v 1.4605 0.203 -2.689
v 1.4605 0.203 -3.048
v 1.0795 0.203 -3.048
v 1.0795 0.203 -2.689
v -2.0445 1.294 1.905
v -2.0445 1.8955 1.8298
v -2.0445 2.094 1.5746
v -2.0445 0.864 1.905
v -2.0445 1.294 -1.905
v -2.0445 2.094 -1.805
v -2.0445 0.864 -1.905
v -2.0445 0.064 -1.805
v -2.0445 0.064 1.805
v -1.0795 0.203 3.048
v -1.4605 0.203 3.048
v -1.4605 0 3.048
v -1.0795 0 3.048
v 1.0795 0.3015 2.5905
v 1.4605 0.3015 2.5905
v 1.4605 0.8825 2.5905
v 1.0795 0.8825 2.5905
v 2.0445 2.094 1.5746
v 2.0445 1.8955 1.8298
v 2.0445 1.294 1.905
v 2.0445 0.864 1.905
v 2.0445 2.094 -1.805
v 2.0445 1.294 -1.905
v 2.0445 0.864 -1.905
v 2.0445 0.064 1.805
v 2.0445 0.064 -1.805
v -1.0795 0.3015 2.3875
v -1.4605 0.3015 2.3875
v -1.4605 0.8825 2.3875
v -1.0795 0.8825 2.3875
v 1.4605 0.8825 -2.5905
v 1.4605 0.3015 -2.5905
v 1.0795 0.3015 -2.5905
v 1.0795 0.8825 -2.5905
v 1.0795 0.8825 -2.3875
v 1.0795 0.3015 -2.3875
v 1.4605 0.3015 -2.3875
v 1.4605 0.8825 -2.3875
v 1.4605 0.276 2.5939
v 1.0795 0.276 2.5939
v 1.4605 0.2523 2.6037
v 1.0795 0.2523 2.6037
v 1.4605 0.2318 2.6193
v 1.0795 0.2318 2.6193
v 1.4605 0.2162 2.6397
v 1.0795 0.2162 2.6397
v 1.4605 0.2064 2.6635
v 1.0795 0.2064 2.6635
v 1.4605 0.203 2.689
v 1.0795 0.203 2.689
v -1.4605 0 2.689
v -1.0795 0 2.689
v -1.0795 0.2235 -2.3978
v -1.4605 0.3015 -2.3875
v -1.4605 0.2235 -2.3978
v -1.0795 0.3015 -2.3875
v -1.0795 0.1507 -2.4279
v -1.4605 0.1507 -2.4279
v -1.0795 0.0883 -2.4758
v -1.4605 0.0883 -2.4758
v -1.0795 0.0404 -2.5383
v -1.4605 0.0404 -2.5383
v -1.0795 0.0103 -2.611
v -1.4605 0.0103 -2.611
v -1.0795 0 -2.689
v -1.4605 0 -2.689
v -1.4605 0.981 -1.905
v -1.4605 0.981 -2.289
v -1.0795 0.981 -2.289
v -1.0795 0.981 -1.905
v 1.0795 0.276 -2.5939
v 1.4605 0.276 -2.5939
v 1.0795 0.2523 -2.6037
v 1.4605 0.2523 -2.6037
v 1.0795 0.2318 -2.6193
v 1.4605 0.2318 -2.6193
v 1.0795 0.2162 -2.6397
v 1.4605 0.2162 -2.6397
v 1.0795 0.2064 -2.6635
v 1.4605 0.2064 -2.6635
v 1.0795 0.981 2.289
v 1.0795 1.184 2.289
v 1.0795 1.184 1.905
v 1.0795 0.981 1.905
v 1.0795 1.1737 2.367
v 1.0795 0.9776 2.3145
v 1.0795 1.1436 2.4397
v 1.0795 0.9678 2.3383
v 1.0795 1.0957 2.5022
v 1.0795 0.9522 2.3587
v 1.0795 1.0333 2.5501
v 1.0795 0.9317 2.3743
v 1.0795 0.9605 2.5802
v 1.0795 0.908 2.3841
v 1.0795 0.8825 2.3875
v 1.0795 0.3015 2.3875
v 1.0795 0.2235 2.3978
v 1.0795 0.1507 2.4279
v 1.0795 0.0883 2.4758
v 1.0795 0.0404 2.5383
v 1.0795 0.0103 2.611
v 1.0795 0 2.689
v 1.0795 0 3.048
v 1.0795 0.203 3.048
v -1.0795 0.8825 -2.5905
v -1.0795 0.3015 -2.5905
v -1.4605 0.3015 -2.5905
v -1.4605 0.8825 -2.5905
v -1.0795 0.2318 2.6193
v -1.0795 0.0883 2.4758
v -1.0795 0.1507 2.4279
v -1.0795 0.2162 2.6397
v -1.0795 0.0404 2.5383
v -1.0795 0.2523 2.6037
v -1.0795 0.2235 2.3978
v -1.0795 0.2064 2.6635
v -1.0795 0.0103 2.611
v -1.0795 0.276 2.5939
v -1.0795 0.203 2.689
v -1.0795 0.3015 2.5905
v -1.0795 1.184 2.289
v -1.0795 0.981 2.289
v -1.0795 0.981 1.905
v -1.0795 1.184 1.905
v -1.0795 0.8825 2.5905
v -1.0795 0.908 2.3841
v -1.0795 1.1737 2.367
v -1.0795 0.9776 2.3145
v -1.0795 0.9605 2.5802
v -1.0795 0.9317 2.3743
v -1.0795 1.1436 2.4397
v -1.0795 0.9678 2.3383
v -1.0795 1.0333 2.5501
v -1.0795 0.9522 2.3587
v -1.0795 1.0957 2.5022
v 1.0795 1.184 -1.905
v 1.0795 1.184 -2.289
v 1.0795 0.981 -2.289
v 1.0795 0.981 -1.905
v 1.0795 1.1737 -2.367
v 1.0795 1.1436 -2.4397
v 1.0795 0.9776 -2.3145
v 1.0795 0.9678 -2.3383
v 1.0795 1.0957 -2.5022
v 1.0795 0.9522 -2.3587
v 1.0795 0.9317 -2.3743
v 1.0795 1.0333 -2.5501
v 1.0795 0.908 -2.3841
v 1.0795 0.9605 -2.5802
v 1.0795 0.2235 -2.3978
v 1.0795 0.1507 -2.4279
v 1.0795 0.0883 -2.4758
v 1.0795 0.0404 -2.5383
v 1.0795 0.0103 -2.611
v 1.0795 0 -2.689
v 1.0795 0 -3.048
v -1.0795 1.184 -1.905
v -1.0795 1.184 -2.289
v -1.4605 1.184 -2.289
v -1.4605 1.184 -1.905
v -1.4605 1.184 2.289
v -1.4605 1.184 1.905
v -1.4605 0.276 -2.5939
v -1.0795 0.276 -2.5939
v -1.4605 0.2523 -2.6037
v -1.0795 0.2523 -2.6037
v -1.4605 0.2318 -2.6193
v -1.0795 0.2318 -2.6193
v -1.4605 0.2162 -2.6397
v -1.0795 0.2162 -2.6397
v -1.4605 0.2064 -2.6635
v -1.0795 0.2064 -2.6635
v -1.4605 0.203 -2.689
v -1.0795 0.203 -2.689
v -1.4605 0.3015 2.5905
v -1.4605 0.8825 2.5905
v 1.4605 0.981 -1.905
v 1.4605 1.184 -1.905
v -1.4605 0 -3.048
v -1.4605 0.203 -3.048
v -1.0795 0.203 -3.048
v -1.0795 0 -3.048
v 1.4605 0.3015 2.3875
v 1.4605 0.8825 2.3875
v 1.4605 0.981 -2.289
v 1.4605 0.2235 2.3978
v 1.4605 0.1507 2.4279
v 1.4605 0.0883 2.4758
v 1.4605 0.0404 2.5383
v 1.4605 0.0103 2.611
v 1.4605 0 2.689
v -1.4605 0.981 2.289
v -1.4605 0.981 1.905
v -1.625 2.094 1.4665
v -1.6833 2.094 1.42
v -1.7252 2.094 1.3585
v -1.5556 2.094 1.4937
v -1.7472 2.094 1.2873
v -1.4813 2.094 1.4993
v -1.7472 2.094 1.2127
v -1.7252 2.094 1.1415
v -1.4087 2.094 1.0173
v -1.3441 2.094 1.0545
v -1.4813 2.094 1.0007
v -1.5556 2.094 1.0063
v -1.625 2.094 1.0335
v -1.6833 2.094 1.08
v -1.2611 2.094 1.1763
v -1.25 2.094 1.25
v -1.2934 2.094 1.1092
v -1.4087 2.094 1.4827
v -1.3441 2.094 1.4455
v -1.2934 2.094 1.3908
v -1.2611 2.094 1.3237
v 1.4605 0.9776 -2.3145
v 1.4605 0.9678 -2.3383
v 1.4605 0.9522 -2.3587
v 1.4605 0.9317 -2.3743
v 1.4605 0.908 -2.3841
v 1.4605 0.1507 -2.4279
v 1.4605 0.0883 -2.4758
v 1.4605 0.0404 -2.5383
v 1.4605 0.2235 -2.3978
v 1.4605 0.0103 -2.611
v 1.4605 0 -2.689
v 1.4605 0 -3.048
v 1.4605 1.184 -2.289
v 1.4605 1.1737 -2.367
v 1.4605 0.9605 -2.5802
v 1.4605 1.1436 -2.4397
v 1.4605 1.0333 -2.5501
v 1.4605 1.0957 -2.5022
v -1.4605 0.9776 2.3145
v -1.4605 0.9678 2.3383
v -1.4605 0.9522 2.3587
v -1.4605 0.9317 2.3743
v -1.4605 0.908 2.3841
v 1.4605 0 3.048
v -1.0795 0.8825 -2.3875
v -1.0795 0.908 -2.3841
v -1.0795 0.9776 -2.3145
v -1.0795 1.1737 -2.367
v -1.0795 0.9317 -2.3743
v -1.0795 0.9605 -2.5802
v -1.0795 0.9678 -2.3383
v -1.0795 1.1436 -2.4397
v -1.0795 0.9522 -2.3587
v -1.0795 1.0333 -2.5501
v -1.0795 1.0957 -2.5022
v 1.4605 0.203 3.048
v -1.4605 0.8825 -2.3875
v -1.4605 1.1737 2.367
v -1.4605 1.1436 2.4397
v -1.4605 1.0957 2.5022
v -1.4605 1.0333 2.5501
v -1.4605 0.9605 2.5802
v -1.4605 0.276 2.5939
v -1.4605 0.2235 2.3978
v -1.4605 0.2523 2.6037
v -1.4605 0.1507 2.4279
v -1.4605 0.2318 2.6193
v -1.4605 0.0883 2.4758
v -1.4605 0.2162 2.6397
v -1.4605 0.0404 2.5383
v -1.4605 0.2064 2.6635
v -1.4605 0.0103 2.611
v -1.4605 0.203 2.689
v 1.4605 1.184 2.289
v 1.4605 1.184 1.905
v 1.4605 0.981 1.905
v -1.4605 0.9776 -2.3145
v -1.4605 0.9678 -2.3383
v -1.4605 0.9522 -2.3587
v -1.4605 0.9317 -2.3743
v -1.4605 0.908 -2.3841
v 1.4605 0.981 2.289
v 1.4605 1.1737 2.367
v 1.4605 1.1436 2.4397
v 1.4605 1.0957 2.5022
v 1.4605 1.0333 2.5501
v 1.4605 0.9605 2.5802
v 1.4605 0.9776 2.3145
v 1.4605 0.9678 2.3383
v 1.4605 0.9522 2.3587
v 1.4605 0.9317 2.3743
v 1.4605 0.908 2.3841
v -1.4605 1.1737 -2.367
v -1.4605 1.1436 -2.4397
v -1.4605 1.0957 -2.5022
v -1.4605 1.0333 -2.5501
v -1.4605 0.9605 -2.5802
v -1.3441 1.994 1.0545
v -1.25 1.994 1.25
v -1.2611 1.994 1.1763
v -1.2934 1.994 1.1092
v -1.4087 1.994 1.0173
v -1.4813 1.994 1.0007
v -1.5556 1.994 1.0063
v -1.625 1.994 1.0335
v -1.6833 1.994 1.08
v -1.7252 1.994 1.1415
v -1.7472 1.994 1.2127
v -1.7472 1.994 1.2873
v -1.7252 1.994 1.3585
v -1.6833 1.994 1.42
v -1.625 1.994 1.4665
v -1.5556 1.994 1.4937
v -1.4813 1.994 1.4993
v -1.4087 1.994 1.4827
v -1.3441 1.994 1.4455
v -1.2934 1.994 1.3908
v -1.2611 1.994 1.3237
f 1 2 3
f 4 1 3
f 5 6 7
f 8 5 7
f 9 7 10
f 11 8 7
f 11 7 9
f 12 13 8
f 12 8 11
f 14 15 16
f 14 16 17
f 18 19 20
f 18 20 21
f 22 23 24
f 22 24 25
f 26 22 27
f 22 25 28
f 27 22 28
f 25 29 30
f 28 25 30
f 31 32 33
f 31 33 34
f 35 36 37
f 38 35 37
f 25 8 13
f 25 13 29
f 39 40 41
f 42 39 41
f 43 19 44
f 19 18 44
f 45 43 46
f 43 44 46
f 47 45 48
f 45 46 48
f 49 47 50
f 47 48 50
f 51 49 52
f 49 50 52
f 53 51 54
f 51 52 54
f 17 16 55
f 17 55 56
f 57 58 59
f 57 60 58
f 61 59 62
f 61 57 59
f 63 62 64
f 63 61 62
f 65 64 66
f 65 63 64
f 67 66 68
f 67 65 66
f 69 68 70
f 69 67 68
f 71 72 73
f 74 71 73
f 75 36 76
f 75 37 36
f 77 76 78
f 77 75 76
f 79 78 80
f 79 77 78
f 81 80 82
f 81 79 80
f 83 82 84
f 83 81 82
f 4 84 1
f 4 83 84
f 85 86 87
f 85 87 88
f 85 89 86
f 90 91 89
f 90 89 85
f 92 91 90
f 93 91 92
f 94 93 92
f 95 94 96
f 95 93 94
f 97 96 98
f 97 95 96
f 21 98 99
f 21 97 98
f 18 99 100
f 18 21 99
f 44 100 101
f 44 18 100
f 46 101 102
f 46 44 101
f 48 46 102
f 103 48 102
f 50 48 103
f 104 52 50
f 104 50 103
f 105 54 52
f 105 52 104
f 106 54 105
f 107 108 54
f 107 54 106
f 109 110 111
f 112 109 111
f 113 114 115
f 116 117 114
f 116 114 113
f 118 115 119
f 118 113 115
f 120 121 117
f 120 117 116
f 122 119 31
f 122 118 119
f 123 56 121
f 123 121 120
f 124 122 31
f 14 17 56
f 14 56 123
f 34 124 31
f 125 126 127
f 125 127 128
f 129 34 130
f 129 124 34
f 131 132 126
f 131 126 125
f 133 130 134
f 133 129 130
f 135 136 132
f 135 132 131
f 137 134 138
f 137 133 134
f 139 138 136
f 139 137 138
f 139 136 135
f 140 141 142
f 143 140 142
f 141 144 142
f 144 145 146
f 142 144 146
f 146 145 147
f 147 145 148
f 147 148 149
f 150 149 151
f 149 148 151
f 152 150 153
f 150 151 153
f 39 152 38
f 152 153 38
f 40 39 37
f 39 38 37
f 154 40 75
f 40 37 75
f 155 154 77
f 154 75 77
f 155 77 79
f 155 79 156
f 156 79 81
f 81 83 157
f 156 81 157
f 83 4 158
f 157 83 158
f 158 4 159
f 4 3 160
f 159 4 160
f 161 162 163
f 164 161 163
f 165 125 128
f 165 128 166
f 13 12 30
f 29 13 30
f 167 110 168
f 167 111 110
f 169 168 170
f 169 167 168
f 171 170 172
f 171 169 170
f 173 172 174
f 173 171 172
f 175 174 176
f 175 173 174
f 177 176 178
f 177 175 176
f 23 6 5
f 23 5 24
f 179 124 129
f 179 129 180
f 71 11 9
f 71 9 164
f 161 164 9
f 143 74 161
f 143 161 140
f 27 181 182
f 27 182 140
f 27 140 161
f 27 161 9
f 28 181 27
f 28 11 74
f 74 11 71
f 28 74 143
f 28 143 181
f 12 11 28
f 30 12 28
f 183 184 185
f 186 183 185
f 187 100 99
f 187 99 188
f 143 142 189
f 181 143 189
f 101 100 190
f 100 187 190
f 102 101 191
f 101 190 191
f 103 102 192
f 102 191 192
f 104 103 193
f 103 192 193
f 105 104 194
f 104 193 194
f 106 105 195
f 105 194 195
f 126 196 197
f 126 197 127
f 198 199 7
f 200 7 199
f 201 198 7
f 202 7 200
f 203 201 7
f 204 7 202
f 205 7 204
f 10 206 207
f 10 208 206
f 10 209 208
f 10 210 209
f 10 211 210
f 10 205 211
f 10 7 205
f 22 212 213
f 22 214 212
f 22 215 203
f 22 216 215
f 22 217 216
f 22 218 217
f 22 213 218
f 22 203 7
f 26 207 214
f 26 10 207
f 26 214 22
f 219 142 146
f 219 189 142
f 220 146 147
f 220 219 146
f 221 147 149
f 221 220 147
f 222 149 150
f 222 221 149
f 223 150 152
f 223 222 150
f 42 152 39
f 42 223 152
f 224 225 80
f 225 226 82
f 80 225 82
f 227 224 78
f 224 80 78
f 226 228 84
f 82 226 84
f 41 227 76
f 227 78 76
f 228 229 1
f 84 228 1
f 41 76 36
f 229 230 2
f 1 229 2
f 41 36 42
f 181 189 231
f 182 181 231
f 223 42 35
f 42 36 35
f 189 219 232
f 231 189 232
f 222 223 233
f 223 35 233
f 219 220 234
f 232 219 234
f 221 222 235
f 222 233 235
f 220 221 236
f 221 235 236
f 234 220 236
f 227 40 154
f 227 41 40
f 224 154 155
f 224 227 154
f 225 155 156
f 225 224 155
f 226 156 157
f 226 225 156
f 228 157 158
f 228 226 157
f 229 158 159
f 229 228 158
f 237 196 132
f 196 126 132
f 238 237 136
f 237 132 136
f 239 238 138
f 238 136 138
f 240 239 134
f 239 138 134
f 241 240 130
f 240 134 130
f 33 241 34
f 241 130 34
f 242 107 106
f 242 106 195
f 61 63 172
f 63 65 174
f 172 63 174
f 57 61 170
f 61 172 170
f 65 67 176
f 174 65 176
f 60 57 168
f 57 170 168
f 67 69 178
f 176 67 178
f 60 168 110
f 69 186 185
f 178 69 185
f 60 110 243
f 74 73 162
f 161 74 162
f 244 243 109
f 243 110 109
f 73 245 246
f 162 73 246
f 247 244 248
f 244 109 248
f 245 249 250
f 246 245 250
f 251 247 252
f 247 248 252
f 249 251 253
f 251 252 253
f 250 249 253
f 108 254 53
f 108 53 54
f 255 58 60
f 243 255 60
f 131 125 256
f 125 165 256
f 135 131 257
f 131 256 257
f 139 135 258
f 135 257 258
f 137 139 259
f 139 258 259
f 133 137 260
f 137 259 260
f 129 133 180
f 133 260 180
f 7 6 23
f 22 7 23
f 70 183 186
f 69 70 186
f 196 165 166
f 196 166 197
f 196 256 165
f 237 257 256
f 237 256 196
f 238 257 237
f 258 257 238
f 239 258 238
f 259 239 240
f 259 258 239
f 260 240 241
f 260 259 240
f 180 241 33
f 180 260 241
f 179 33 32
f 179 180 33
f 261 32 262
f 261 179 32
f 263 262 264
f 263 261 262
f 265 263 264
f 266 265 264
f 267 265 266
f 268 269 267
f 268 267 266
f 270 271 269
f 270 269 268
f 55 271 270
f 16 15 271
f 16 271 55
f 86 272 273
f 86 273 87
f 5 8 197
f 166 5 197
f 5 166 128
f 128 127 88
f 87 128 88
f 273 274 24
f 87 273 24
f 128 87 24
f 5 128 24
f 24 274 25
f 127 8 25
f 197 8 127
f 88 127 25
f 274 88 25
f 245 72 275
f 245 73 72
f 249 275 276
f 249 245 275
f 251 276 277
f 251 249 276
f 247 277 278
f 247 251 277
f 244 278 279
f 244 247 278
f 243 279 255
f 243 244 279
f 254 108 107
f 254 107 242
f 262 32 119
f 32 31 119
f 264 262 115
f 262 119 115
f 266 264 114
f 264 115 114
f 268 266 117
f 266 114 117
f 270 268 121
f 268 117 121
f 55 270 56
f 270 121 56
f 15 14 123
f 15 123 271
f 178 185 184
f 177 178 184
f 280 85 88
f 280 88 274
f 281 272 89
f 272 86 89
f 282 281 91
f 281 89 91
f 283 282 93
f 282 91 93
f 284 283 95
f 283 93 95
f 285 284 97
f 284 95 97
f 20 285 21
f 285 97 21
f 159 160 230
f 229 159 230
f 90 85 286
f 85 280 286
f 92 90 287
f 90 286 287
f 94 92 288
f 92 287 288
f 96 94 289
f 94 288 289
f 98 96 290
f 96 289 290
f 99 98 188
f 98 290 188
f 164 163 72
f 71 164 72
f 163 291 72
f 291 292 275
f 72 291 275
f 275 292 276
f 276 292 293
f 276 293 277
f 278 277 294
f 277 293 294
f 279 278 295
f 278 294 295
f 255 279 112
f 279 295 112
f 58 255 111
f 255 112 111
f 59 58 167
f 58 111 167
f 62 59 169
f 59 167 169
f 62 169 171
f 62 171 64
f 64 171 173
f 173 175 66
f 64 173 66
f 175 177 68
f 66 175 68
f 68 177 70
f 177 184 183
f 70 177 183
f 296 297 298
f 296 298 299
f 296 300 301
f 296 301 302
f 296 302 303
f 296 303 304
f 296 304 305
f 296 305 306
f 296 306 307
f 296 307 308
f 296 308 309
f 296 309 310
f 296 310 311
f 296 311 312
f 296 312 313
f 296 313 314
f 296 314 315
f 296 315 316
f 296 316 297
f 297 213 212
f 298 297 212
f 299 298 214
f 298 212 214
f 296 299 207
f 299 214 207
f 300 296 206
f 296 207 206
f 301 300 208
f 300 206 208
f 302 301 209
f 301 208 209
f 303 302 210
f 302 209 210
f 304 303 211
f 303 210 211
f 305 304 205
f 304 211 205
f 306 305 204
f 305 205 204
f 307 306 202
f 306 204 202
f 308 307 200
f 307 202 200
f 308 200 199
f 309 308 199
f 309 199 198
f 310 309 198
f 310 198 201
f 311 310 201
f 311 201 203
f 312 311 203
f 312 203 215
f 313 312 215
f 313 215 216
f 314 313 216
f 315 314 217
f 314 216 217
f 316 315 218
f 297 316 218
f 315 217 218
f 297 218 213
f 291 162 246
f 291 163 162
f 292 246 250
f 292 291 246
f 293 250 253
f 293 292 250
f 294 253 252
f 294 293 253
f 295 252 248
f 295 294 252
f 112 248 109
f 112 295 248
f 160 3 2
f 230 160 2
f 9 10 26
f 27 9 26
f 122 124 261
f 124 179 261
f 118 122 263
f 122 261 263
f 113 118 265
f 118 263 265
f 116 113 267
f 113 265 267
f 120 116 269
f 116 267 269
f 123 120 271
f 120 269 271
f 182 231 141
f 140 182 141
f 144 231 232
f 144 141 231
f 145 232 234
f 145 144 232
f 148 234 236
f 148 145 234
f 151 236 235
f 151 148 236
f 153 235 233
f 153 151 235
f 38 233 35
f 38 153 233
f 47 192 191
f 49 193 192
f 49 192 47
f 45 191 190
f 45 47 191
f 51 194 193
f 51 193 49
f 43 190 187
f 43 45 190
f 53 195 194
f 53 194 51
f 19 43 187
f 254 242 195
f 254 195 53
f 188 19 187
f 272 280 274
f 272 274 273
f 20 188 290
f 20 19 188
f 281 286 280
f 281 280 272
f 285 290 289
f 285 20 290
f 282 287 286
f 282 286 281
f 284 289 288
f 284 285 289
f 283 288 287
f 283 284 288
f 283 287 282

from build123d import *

# Parameters (mm, degrees)
SKETCH_1_W             = 4.089
SKETCH_1_H             = 3.81
EXTRUDE_1_DEPTH        = 2.03
CHAMFER_1_SIZE         = 0.8
CHAMFER_1_SIZE2        = 0.1
CHAMFER_1_PART_2_SIZE  = 0.8
CHAMFER_1_PART_2_SIZE2 = 0.1
CHAMFER_2_SIZE         = 0.1
CHAMFER_2_SIZE2        = 0.8
CHAMFER_3_SIZE2        = 0.2
CHAMFER_3_SIZE         = 0.230350221
SKETCH_2_R             = 0.25
CUT_EXTRUDE_1_DEPTH    = 0.1
SKETCH_3_W             = 0.381
SKETCH_3_H             = 0.203


with BuildPart() as part:
    # Эскиз1 → Бобышка-Вытянуть1 (new body)
    with BuildSketch(Plane(origin=(0, 0.064, 0), x_dir=(1, 0, 0), z_dir=(0, 1, 0))):
        Rectangle(SKETCH_1_W, SKETCH_1_H)
    extrude(amount=EXTRUDE_1_DEPTH)

    # Фаска1
    chamfer_1_edges = [part.edges().sort_by_distance(p)[0] for p in [
        (0, 2.094, 1.905),
    ]]
    chamfer_1_side = [part.faces().sort_by_distance(p)[0] for p in [
        (0, 1.079, 1.905),
    ]]
    chamfer(chamfer_1_edges, length=CHAMFER_1_SIZE, length2=CHAMFER_1_SIZE2, reference=chamfer_1_side[0])

    # Фаска1 part 2
    chamfer_1_part_2_edges = [part.edges().sort_by_distance(p)[0] for p in [
        (0, 2.094, -1.905),
    ]]
    chamfer_1_part_2_side = [part.faces().sort_by_distance(p)[0] for p in [
        (0, 1.079, -1.905),
    ]]
    chamfer(chamfer_1_part_2_edges, length=CHAMFER_1_PART_2_SIZE, length2=CHAMFER_1_PART_2_SIZE2, reference=chamfer_1_part_2_side[0])

    # Фаска2
    chamfer_2_edges = [part.edges().sort_by_distance(p)[0] for p in [
        (0, 0.064, 1.905),
        (0, 0.064, -1.905),
    ]]
    chamfer_2_side = [part.faces().sort_by_distance(p)[0] for p in [
        (0, 0.064, 0),
    ]]
    chamfer(chamfer_2_edges, length=CHAMFER_2_SIZE, length2=CHAMFER_2_SIZE2, reference=chamfer_2_side[0])

    # Фаска3
    chamfer_3_edges = [part.edges().sort_by_distance(p)[0] for p in [
        (0, 2.094, 1.805),
    ]]
    chamfer(chamfer_3_edges, length=CHAMFER_3_SIZE, length2=CHAMFER_3_SIZE2)

    # Эскиз2 → Вырез-Вытянуть1 (cut)
    with BuildSketch(Plane(origin=(0, 2.094, 0), x_dir=(1, 0, 0), z_dir=(0, 1, 0))):
        with Locations((-1.5, -1.25)):
            Circle(SKETCH_2_R)
    extrude(amount=-CUT_EXTRUDE_1_DEPTH, mode=Mode.SUBTRACT)

    # По траектории1: sweep along a path in Эскиз5
    with BuildLine(Plane(origin=(0, 0, 0), x_dir=(0, 0, -1), z_dir=(1, 0, 0))) as sweep_1_path:
        Line((-1.905, 1.0825), (-2.289, 1.0825))
        ThreePointArc((-2.289, 1.0825), (-2.430421356, 1.023921356), (-2.489, 0.8825))
        Line((-2.489, 0.8825), (-2.489, 0.3015))
        ThreePointArc((-2.489, 0.3015), (-2.547578644, 0.160078644), (-2.689, 0.1015))
        Line((-2.689, 0.1015), (-3.048, 0.1015))
    # Эскиз3 → По траектории1 (sweep)
    with BuildSketch(Plane.XY.offset(1.905)):
        with Locations((-1.27, 1.0825)):
            Rectangle(SKETCH_3_W, SKETCH_3_H)
        with Locations((1.27, 1.0825)):
            Rectangle(SKETCH_3_W, SKETCH_3_H)
    sweep_1 = sweep(path=sweep_1_path.line)

    # Зеркальное отражение1: По траектории1 across plane
    add(sweep_1.mirror(Plane.XY))


solid = part.part
